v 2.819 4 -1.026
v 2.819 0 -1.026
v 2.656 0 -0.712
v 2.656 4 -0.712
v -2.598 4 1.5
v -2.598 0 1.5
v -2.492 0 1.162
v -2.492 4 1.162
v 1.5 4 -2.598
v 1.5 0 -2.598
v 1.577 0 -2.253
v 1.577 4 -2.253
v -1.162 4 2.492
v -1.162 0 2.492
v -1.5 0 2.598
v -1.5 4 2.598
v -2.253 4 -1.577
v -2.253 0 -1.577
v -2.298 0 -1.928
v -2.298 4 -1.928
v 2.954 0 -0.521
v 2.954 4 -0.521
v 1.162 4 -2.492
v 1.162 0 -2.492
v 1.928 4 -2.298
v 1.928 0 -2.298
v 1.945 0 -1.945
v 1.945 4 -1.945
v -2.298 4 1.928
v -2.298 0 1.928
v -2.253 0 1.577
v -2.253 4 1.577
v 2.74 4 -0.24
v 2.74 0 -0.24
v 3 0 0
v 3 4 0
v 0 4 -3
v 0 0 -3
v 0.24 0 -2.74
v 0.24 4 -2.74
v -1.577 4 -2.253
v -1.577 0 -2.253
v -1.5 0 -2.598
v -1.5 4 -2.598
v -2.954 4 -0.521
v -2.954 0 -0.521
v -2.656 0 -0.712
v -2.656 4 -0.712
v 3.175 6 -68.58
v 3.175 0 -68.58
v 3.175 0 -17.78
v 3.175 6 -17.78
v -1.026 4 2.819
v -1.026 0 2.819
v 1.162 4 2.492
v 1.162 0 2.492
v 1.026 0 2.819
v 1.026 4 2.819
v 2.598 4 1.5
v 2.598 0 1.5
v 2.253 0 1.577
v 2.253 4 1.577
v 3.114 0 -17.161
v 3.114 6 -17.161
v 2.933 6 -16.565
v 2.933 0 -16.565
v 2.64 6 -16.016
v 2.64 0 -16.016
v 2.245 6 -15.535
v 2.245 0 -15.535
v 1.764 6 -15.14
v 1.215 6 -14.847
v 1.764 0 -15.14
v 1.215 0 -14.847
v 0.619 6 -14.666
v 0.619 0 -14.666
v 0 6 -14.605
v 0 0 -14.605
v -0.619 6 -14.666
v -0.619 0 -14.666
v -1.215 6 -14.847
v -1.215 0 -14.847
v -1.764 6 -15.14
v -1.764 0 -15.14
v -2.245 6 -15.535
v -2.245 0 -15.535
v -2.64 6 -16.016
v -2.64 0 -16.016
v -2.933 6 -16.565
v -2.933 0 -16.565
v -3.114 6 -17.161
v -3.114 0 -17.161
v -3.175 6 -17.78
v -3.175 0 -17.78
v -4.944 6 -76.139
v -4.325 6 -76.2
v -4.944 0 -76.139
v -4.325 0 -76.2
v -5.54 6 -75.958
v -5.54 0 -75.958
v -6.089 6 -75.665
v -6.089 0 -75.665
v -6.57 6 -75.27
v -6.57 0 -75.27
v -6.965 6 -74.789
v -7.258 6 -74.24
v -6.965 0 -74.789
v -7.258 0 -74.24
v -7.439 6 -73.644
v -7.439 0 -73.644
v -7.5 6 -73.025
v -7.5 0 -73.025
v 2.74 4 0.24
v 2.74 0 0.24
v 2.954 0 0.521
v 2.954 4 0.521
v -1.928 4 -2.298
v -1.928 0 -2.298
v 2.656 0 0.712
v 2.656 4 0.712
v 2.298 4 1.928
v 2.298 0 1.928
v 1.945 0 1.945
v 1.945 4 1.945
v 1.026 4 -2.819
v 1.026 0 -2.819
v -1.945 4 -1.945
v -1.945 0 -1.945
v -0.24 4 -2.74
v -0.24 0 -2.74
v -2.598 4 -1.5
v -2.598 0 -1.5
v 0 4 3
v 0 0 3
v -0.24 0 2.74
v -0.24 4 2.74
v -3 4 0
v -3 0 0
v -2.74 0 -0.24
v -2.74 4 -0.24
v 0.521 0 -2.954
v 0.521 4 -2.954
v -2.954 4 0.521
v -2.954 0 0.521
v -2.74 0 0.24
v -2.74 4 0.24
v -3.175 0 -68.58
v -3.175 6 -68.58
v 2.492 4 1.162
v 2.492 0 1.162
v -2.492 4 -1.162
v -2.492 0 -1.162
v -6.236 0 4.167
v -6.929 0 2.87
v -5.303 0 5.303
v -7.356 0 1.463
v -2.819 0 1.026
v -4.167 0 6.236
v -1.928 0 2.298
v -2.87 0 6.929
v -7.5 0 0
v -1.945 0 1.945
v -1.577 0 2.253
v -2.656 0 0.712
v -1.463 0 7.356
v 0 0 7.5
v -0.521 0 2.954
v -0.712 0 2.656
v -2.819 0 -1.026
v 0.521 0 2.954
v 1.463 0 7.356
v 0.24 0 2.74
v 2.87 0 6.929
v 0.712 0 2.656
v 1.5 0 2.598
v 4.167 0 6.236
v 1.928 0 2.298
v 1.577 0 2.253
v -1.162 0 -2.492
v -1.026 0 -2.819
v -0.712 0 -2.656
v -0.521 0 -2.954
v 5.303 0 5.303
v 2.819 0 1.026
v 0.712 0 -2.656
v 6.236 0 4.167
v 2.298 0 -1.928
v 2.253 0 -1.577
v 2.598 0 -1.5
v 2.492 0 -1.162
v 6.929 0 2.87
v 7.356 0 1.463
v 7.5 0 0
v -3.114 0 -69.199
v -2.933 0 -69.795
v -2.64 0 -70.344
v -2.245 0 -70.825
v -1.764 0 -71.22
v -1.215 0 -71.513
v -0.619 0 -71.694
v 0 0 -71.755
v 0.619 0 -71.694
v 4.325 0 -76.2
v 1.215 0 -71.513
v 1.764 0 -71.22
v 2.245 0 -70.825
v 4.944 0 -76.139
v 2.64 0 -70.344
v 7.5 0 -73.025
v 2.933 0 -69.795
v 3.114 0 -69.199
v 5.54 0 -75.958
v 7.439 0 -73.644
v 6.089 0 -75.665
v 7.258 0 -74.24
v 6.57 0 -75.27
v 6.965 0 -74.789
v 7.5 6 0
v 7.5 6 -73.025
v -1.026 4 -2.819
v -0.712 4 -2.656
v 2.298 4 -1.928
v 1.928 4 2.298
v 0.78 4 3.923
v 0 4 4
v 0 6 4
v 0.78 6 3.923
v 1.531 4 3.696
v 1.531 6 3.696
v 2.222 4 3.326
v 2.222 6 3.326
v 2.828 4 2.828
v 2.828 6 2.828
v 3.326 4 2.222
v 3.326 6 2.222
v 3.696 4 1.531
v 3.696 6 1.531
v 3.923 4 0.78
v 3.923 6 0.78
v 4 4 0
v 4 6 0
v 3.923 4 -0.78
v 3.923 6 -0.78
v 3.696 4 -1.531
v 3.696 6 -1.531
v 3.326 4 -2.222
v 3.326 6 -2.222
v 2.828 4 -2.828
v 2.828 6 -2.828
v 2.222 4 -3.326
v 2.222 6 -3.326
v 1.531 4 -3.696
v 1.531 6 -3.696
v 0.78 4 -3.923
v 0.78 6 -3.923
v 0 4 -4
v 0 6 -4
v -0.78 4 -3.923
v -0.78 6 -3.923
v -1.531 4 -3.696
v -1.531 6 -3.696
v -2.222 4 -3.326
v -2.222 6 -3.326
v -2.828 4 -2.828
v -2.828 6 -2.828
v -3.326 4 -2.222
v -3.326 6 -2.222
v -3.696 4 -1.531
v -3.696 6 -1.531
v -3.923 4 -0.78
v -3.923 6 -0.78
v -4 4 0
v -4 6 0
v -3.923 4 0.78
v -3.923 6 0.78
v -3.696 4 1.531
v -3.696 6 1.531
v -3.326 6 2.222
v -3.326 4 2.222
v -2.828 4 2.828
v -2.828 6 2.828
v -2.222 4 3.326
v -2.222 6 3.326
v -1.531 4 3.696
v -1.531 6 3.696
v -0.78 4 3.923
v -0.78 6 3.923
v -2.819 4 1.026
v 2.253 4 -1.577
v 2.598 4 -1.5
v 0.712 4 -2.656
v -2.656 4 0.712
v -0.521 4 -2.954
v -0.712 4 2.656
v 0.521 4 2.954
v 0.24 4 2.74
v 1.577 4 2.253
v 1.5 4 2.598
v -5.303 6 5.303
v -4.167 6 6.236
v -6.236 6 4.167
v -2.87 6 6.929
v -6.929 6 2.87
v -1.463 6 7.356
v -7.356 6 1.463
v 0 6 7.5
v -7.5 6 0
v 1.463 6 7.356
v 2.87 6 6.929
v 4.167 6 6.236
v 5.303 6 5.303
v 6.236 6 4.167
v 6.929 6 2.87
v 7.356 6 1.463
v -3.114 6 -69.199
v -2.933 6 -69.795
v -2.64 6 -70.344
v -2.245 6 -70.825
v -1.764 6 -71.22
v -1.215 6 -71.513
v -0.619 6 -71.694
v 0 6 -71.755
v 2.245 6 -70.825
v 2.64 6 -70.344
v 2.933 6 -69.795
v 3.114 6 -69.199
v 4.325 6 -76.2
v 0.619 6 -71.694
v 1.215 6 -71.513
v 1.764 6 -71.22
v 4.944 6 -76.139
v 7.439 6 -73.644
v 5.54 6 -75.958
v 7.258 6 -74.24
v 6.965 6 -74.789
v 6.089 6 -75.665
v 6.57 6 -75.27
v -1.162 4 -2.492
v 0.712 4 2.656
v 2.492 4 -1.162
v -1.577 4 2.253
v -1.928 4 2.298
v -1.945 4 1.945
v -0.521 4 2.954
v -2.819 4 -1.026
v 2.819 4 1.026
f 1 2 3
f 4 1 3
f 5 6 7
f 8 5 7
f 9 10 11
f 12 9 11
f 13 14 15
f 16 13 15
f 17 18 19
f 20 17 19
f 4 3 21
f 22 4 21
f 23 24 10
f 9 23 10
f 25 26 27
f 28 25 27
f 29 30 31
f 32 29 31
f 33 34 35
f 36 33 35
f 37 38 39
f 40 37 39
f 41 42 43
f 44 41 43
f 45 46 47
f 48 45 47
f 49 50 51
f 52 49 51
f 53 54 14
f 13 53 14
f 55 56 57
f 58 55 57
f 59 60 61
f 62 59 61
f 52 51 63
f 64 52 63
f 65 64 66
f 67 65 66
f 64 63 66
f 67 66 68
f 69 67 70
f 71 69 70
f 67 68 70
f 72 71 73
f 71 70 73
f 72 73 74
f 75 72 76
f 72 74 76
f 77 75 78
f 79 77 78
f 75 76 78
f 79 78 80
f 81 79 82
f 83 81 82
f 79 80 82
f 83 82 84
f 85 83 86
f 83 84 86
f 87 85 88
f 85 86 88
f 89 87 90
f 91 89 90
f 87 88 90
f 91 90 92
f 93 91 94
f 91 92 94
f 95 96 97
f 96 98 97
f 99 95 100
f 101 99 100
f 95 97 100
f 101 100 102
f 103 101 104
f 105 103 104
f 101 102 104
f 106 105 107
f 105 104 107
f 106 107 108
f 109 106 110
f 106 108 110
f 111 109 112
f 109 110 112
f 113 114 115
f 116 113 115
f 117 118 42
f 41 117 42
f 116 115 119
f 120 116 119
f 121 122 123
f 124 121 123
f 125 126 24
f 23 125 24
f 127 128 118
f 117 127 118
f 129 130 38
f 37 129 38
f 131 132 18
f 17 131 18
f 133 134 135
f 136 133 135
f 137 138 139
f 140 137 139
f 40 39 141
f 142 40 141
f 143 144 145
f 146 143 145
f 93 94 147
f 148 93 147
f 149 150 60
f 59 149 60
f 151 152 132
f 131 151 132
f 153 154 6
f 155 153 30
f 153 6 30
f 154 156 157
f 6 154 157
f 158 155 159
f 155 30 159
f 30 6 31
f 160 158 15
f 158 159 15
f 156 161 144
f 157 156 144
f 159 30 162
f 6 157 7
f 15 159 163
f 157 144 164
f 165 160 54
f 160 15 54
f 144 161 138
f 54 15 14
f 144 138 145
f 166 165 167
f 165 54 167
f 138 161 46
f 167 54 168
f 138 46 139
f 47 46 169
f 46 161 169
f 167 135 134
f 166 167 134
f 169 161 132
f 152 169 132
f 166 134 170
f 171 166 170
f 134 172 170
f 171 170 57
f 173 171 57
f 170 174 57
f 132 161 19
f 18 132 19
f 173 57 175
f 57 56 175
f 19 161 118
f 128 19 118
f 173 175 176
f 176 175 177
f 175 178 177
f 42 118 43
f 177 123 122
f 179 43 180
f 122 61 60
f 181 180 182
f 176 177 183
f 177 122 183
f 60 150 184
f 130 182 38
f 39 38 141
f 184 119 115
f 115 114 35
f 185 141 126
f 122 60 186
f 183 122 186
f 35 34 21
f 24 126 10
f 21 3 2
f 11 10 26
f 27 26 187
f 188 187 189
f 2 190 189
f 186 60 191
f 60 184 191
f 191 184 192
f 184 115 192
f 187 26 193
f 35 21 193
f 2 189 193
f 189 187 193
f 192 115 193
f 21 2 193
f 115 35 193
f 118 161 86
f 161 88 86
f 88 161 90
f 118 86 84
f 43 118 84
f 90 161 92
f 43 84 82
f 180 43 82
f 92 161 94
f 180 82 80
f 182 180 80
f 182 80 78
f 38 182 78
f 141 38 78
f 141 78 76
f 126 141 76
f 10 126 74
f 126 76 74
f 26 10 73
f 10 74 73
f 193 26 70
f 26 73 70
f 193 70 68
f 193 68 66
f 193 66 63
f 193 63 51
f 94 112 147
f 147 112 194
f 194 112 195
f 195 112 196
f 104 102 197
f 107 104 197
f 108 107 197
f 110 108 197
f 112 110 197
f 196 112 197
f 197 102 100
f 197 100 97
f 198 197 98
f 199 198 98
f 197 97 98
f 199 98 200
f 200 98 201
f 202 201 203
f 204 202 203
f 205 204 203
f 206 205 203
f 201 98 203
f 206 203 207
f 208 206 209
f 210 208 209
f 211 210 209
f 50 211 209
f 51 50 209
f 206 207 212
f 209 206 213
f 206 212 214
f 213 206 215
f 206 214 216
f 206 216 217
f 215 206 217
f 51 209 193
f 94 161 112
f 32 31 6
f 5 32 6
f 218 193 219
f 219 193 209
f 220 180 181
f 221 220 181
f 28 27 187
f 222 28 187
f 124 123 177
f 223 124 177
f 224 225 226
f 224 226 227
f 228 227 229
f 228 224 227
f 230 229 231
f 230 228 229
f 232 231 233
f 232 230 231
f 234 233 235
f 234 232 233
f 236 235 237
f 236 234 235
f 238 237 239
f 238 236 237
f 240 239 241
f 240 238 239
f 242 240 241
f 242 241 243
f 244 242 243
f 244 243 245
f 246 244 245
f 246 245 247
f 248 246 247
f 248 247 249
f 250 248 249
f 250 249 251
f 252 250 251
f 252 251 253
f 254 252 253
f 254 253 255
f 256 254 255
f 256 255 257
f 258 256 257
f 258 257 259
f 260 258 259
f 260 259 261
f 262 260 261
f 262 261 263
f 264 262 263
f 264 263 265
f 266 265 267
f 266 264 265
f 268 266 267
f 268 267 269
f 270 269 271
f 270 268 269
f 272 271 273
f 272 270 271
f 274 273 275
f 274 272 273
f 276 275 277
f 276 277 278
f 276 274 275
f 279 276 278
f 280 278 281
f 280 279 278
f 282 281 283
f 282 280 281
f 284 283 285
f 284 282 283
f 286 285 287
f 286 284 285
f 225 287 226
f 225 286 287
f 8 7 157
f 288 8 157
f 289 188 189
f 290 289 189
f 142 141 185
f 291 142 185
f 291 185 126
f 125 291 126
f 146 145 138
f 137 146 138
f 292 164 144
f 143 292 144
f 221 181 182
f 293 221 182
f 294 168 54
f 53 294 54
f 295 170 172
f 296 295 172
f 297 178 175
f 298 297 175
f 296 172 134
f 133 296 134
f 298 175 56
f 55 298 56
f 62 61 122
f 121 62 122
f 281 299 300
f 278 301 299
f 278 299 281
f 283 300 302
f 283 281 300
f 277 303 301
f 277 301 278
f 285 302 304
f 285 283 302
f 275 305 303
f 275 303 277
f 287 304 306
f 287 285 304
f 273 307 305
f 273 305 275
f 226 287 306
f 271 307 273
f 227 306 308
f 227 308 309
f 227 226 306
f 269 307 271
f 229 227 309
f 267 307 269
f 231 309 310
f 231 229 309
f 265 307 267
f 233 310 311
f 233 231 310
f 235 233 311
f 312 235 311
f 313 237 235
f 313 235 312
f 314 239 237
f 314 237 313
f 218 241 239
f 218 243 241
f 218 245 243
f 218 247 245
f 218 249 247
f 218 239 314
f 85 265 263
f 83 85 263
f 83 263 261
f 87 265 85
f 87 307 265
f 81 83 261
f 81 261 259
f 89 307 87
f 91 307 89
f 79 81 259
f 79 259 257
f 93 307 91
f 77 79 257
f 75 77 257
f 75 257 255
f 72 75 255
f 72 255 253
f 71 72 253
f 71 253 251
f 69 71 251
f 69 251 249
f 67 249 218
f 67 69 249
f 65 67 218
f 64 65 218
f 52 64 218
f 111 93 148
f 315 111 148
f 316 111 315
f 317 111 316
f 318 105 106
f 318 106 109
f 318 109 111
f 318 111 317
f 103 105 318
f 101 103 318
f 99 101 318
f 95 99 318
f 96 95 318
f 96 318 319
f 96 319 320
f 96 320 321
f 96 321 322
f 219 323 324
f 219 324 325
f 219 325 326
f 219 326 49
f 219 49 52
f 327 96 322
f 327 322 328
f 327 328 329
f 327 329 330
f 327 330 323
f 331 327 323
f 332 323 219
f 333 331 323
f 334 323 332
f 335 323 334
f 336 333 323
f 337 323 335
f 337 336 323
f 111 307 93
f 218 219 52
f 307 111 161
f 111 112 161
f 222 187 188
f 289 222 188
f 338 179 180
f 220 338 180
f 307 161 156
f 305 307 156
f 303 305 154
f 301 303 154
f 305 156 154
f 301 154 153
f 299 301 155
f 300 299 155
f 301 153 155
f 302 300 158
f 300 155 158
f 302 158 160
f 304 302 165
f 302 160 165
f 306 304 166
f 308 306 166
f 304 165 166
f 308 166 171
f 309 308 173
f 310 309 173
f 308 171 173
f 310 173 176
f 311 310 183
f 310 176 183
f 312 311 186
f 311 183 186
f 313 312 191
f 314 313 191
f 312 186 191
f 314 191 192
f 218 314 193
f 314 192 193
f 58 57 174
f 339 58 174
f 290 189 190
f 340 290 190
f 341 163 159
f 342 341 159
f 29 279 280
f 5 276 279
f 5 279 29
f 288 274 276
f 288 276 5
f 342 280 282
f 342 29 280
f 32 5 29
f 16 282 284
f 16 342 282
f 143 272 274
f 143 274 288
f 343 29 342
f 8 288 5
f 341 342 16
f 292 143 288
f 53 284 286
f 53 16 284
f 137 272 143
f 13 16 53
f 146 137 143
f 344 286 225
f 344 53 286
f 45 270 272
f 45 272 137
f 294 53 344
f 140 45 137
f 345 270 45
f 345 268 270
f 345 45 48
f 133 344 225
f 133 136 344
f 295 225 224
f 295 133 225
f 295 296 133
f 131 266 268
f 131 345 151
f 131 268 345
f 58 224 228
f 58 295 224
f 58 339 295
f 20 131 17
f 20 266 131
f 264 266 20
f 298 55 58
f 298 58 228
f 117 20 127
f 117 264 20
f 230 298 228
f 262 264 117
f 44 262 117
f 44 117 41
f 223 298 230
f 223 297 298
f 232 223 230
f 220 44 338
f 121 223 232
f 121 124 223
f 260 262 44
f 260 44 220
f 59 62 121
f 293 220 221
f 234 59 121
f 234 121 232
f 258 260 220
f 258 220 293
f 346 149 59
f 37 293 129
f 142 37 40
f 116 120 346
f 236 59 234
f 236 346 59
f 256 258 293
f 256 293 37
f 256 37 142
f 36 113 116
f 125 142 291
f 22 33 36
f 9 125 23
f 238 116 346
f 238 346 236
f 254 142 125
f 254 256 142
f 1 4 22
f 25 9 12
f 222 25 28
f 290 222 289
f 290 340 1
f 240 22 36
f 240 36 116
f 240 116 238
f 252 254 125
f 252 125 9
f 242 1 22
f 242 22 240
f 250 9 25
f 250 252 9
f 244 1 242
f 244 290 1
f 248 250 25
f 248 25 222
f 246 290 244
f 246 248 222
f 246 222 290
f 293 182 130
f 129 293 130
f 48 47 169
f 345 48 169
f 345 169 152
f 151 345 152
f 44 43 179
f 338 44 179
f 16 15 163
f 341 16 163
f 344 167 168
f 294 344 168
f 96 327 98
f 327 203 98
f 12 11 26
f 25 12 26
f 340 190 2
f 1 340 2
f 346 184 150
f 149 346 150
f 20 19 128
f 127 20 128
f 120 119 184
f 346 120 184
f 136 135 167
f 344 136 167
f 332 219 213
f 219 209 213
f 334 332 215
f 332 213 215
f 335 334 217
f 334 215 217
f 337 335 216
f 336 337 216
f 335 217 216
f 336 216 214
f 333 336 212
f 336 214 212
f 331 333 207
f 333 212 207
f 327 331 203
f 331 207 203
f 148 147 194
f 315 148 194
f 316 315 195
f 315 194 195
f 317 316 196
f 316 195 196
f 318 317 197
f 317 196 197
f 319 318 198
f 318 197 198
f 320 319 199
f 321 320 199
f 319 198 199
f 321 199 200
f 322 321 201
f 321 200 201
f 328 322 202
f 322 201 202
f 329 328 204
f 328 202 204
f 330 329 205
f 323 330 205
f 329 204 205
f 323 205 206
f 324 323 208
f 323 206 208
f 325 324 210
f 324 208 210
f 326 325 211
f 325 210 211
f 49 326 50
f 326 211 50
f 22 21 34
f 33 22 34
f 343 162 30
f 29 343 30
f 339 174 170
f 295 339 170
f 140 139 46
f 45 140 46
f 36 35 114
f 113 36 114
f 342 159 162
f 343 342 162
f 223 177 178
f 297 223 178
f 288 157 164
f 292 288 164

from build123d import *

# Parameters (mm, degrees)
SALIENTE_EXTRUIR1_DEPTH = 4
CROQUIS1_3_R            = 4
SALIENTE_EXTRUIR2_DEPTH = 6
SALIENTE_EXTRUIR3_DEPTH = 4
MATRIZC1_COUNT          = 36
FILLET1_R               = 3.175


with BuildPart() as part:
    # Croquis1 → Saliente-Extruir1 (new body)
    with BuildSketch(Plane(origin=(0, 0, 0), x_dir=(1, 0, 0), z_dir=(0, 1, 0))):
        with BuildLine():
            Line((-7.5, 76.2), (-7.5, 0))
            ThreePointArc((-7.5, 0), (0, -7.5), (7.5, 0))
            Line((7.5, 0), (7.5, 76.2))
            Line((7.5, 76.2), (-7.5, 76.2))
        make_face()
        with BuildLine():
            ThreePointArc((-3.175, 68.58), (0, 71.755), (3.175, 68.58))
            Line((3.175, 68.58), (3.175, 17.78))
            ThreePointArc((3.175, 17.78), (0, 14.605), (-3.175, 17.78))
            Line((-3.175, 17.78), (-3.175, 68.58))
        make_face(mode=Mode.SUBTRACT)
        with BuildLine():
            ThreePointArc((-2.988584094, 0.261467228), (-2.974334584, 0.391578577), (-2.954423259, 0.520944533))
            ThreePointArc((-2.954423259, 0.520944533), (2.974334584, -0.391578577), (-2.988584094, 0.261467228))
        make_face(mode=Mode.SUBTRACT)
    extrude(amount=SALIENTE_EXTRUIR1_DEPTH)

    # Croquis1<3> → Saliente-Extruir2 (add)
    with BuildSketch(Plane(origin=(0, 0, 0), x_dir=(1, 0, 0), z_dir=(0, 1, 0))):
        with BuildLine():
            Line((-7.5, 76.2), (-7.5, 0))
            ThreePointArc((-7.5, 0), (0, -7.5), (7.5, 0))
            Line((7.5, 0), (7.5, 76.2))
            Line((7.5, 76.2), (-7.5, 76.2))
        make_face()
        with BuildLine():
            ThreePointArc((-3.175, 68.58), (0, 71.755), (3.175, 68.58))
            Line((3.175, 68.58), (3.175, 17.78))
            ThreePointArc((3.175, 17.78), (0, 14.605), (-3.175, 17.78))
            Line((-3.175, 17.78), (-3.175, 68.58))
        make_face(mode=Mode.SUBTRACT)
        Circle(CROQUIS1_3_R, mode=Mode.SUBTRACT)
    extrude(amount=SALIENTE_EXTRUIR2_DEPTH)

    # Croquis1<4> → Saliente-Extruir3 (add)
    with BuildSketch(Plane(origin=(0, 0, 0), x_dir=(1, 0, 0), z_dir=(0, 1, 0))):
        with BuildLine():
            Line((-3, 0), (-2.73953542, 0.239678293))
            Line((-2.73953542, 0.239678293), (-2.954423259, 0.520944533))
            ThreePointArc((-2.954423259, 0.520944533), (-2.988584094, 0.261467228), (-3, 0))
        make_face()
    saliente_extruir3 = extrude(amount=SALIENTE_EXTRUIR3_DEPTH)

    # MatrizC1: Saliente-Extruir3 ×36 about axis
    matrizc1_axis = Axis((0, 6, 0), (0, -1, 0))
    for i in range(1, MATRIZC1_COUNT):
        add(saliente_extruir3.rotate(matrizc1_axis, i * 360 / MATRIZC1_COUNT))

    # Fillet1
    fillet1_edges = [part.edges().sort_by_distance(p)[0] for p in [
        (-7.5, 3, -76.2),
        (7.5, 3, -76.2),
    ]]
    fillet(fillet1_edges, radius=FILLET1_R)


solid = part.part
